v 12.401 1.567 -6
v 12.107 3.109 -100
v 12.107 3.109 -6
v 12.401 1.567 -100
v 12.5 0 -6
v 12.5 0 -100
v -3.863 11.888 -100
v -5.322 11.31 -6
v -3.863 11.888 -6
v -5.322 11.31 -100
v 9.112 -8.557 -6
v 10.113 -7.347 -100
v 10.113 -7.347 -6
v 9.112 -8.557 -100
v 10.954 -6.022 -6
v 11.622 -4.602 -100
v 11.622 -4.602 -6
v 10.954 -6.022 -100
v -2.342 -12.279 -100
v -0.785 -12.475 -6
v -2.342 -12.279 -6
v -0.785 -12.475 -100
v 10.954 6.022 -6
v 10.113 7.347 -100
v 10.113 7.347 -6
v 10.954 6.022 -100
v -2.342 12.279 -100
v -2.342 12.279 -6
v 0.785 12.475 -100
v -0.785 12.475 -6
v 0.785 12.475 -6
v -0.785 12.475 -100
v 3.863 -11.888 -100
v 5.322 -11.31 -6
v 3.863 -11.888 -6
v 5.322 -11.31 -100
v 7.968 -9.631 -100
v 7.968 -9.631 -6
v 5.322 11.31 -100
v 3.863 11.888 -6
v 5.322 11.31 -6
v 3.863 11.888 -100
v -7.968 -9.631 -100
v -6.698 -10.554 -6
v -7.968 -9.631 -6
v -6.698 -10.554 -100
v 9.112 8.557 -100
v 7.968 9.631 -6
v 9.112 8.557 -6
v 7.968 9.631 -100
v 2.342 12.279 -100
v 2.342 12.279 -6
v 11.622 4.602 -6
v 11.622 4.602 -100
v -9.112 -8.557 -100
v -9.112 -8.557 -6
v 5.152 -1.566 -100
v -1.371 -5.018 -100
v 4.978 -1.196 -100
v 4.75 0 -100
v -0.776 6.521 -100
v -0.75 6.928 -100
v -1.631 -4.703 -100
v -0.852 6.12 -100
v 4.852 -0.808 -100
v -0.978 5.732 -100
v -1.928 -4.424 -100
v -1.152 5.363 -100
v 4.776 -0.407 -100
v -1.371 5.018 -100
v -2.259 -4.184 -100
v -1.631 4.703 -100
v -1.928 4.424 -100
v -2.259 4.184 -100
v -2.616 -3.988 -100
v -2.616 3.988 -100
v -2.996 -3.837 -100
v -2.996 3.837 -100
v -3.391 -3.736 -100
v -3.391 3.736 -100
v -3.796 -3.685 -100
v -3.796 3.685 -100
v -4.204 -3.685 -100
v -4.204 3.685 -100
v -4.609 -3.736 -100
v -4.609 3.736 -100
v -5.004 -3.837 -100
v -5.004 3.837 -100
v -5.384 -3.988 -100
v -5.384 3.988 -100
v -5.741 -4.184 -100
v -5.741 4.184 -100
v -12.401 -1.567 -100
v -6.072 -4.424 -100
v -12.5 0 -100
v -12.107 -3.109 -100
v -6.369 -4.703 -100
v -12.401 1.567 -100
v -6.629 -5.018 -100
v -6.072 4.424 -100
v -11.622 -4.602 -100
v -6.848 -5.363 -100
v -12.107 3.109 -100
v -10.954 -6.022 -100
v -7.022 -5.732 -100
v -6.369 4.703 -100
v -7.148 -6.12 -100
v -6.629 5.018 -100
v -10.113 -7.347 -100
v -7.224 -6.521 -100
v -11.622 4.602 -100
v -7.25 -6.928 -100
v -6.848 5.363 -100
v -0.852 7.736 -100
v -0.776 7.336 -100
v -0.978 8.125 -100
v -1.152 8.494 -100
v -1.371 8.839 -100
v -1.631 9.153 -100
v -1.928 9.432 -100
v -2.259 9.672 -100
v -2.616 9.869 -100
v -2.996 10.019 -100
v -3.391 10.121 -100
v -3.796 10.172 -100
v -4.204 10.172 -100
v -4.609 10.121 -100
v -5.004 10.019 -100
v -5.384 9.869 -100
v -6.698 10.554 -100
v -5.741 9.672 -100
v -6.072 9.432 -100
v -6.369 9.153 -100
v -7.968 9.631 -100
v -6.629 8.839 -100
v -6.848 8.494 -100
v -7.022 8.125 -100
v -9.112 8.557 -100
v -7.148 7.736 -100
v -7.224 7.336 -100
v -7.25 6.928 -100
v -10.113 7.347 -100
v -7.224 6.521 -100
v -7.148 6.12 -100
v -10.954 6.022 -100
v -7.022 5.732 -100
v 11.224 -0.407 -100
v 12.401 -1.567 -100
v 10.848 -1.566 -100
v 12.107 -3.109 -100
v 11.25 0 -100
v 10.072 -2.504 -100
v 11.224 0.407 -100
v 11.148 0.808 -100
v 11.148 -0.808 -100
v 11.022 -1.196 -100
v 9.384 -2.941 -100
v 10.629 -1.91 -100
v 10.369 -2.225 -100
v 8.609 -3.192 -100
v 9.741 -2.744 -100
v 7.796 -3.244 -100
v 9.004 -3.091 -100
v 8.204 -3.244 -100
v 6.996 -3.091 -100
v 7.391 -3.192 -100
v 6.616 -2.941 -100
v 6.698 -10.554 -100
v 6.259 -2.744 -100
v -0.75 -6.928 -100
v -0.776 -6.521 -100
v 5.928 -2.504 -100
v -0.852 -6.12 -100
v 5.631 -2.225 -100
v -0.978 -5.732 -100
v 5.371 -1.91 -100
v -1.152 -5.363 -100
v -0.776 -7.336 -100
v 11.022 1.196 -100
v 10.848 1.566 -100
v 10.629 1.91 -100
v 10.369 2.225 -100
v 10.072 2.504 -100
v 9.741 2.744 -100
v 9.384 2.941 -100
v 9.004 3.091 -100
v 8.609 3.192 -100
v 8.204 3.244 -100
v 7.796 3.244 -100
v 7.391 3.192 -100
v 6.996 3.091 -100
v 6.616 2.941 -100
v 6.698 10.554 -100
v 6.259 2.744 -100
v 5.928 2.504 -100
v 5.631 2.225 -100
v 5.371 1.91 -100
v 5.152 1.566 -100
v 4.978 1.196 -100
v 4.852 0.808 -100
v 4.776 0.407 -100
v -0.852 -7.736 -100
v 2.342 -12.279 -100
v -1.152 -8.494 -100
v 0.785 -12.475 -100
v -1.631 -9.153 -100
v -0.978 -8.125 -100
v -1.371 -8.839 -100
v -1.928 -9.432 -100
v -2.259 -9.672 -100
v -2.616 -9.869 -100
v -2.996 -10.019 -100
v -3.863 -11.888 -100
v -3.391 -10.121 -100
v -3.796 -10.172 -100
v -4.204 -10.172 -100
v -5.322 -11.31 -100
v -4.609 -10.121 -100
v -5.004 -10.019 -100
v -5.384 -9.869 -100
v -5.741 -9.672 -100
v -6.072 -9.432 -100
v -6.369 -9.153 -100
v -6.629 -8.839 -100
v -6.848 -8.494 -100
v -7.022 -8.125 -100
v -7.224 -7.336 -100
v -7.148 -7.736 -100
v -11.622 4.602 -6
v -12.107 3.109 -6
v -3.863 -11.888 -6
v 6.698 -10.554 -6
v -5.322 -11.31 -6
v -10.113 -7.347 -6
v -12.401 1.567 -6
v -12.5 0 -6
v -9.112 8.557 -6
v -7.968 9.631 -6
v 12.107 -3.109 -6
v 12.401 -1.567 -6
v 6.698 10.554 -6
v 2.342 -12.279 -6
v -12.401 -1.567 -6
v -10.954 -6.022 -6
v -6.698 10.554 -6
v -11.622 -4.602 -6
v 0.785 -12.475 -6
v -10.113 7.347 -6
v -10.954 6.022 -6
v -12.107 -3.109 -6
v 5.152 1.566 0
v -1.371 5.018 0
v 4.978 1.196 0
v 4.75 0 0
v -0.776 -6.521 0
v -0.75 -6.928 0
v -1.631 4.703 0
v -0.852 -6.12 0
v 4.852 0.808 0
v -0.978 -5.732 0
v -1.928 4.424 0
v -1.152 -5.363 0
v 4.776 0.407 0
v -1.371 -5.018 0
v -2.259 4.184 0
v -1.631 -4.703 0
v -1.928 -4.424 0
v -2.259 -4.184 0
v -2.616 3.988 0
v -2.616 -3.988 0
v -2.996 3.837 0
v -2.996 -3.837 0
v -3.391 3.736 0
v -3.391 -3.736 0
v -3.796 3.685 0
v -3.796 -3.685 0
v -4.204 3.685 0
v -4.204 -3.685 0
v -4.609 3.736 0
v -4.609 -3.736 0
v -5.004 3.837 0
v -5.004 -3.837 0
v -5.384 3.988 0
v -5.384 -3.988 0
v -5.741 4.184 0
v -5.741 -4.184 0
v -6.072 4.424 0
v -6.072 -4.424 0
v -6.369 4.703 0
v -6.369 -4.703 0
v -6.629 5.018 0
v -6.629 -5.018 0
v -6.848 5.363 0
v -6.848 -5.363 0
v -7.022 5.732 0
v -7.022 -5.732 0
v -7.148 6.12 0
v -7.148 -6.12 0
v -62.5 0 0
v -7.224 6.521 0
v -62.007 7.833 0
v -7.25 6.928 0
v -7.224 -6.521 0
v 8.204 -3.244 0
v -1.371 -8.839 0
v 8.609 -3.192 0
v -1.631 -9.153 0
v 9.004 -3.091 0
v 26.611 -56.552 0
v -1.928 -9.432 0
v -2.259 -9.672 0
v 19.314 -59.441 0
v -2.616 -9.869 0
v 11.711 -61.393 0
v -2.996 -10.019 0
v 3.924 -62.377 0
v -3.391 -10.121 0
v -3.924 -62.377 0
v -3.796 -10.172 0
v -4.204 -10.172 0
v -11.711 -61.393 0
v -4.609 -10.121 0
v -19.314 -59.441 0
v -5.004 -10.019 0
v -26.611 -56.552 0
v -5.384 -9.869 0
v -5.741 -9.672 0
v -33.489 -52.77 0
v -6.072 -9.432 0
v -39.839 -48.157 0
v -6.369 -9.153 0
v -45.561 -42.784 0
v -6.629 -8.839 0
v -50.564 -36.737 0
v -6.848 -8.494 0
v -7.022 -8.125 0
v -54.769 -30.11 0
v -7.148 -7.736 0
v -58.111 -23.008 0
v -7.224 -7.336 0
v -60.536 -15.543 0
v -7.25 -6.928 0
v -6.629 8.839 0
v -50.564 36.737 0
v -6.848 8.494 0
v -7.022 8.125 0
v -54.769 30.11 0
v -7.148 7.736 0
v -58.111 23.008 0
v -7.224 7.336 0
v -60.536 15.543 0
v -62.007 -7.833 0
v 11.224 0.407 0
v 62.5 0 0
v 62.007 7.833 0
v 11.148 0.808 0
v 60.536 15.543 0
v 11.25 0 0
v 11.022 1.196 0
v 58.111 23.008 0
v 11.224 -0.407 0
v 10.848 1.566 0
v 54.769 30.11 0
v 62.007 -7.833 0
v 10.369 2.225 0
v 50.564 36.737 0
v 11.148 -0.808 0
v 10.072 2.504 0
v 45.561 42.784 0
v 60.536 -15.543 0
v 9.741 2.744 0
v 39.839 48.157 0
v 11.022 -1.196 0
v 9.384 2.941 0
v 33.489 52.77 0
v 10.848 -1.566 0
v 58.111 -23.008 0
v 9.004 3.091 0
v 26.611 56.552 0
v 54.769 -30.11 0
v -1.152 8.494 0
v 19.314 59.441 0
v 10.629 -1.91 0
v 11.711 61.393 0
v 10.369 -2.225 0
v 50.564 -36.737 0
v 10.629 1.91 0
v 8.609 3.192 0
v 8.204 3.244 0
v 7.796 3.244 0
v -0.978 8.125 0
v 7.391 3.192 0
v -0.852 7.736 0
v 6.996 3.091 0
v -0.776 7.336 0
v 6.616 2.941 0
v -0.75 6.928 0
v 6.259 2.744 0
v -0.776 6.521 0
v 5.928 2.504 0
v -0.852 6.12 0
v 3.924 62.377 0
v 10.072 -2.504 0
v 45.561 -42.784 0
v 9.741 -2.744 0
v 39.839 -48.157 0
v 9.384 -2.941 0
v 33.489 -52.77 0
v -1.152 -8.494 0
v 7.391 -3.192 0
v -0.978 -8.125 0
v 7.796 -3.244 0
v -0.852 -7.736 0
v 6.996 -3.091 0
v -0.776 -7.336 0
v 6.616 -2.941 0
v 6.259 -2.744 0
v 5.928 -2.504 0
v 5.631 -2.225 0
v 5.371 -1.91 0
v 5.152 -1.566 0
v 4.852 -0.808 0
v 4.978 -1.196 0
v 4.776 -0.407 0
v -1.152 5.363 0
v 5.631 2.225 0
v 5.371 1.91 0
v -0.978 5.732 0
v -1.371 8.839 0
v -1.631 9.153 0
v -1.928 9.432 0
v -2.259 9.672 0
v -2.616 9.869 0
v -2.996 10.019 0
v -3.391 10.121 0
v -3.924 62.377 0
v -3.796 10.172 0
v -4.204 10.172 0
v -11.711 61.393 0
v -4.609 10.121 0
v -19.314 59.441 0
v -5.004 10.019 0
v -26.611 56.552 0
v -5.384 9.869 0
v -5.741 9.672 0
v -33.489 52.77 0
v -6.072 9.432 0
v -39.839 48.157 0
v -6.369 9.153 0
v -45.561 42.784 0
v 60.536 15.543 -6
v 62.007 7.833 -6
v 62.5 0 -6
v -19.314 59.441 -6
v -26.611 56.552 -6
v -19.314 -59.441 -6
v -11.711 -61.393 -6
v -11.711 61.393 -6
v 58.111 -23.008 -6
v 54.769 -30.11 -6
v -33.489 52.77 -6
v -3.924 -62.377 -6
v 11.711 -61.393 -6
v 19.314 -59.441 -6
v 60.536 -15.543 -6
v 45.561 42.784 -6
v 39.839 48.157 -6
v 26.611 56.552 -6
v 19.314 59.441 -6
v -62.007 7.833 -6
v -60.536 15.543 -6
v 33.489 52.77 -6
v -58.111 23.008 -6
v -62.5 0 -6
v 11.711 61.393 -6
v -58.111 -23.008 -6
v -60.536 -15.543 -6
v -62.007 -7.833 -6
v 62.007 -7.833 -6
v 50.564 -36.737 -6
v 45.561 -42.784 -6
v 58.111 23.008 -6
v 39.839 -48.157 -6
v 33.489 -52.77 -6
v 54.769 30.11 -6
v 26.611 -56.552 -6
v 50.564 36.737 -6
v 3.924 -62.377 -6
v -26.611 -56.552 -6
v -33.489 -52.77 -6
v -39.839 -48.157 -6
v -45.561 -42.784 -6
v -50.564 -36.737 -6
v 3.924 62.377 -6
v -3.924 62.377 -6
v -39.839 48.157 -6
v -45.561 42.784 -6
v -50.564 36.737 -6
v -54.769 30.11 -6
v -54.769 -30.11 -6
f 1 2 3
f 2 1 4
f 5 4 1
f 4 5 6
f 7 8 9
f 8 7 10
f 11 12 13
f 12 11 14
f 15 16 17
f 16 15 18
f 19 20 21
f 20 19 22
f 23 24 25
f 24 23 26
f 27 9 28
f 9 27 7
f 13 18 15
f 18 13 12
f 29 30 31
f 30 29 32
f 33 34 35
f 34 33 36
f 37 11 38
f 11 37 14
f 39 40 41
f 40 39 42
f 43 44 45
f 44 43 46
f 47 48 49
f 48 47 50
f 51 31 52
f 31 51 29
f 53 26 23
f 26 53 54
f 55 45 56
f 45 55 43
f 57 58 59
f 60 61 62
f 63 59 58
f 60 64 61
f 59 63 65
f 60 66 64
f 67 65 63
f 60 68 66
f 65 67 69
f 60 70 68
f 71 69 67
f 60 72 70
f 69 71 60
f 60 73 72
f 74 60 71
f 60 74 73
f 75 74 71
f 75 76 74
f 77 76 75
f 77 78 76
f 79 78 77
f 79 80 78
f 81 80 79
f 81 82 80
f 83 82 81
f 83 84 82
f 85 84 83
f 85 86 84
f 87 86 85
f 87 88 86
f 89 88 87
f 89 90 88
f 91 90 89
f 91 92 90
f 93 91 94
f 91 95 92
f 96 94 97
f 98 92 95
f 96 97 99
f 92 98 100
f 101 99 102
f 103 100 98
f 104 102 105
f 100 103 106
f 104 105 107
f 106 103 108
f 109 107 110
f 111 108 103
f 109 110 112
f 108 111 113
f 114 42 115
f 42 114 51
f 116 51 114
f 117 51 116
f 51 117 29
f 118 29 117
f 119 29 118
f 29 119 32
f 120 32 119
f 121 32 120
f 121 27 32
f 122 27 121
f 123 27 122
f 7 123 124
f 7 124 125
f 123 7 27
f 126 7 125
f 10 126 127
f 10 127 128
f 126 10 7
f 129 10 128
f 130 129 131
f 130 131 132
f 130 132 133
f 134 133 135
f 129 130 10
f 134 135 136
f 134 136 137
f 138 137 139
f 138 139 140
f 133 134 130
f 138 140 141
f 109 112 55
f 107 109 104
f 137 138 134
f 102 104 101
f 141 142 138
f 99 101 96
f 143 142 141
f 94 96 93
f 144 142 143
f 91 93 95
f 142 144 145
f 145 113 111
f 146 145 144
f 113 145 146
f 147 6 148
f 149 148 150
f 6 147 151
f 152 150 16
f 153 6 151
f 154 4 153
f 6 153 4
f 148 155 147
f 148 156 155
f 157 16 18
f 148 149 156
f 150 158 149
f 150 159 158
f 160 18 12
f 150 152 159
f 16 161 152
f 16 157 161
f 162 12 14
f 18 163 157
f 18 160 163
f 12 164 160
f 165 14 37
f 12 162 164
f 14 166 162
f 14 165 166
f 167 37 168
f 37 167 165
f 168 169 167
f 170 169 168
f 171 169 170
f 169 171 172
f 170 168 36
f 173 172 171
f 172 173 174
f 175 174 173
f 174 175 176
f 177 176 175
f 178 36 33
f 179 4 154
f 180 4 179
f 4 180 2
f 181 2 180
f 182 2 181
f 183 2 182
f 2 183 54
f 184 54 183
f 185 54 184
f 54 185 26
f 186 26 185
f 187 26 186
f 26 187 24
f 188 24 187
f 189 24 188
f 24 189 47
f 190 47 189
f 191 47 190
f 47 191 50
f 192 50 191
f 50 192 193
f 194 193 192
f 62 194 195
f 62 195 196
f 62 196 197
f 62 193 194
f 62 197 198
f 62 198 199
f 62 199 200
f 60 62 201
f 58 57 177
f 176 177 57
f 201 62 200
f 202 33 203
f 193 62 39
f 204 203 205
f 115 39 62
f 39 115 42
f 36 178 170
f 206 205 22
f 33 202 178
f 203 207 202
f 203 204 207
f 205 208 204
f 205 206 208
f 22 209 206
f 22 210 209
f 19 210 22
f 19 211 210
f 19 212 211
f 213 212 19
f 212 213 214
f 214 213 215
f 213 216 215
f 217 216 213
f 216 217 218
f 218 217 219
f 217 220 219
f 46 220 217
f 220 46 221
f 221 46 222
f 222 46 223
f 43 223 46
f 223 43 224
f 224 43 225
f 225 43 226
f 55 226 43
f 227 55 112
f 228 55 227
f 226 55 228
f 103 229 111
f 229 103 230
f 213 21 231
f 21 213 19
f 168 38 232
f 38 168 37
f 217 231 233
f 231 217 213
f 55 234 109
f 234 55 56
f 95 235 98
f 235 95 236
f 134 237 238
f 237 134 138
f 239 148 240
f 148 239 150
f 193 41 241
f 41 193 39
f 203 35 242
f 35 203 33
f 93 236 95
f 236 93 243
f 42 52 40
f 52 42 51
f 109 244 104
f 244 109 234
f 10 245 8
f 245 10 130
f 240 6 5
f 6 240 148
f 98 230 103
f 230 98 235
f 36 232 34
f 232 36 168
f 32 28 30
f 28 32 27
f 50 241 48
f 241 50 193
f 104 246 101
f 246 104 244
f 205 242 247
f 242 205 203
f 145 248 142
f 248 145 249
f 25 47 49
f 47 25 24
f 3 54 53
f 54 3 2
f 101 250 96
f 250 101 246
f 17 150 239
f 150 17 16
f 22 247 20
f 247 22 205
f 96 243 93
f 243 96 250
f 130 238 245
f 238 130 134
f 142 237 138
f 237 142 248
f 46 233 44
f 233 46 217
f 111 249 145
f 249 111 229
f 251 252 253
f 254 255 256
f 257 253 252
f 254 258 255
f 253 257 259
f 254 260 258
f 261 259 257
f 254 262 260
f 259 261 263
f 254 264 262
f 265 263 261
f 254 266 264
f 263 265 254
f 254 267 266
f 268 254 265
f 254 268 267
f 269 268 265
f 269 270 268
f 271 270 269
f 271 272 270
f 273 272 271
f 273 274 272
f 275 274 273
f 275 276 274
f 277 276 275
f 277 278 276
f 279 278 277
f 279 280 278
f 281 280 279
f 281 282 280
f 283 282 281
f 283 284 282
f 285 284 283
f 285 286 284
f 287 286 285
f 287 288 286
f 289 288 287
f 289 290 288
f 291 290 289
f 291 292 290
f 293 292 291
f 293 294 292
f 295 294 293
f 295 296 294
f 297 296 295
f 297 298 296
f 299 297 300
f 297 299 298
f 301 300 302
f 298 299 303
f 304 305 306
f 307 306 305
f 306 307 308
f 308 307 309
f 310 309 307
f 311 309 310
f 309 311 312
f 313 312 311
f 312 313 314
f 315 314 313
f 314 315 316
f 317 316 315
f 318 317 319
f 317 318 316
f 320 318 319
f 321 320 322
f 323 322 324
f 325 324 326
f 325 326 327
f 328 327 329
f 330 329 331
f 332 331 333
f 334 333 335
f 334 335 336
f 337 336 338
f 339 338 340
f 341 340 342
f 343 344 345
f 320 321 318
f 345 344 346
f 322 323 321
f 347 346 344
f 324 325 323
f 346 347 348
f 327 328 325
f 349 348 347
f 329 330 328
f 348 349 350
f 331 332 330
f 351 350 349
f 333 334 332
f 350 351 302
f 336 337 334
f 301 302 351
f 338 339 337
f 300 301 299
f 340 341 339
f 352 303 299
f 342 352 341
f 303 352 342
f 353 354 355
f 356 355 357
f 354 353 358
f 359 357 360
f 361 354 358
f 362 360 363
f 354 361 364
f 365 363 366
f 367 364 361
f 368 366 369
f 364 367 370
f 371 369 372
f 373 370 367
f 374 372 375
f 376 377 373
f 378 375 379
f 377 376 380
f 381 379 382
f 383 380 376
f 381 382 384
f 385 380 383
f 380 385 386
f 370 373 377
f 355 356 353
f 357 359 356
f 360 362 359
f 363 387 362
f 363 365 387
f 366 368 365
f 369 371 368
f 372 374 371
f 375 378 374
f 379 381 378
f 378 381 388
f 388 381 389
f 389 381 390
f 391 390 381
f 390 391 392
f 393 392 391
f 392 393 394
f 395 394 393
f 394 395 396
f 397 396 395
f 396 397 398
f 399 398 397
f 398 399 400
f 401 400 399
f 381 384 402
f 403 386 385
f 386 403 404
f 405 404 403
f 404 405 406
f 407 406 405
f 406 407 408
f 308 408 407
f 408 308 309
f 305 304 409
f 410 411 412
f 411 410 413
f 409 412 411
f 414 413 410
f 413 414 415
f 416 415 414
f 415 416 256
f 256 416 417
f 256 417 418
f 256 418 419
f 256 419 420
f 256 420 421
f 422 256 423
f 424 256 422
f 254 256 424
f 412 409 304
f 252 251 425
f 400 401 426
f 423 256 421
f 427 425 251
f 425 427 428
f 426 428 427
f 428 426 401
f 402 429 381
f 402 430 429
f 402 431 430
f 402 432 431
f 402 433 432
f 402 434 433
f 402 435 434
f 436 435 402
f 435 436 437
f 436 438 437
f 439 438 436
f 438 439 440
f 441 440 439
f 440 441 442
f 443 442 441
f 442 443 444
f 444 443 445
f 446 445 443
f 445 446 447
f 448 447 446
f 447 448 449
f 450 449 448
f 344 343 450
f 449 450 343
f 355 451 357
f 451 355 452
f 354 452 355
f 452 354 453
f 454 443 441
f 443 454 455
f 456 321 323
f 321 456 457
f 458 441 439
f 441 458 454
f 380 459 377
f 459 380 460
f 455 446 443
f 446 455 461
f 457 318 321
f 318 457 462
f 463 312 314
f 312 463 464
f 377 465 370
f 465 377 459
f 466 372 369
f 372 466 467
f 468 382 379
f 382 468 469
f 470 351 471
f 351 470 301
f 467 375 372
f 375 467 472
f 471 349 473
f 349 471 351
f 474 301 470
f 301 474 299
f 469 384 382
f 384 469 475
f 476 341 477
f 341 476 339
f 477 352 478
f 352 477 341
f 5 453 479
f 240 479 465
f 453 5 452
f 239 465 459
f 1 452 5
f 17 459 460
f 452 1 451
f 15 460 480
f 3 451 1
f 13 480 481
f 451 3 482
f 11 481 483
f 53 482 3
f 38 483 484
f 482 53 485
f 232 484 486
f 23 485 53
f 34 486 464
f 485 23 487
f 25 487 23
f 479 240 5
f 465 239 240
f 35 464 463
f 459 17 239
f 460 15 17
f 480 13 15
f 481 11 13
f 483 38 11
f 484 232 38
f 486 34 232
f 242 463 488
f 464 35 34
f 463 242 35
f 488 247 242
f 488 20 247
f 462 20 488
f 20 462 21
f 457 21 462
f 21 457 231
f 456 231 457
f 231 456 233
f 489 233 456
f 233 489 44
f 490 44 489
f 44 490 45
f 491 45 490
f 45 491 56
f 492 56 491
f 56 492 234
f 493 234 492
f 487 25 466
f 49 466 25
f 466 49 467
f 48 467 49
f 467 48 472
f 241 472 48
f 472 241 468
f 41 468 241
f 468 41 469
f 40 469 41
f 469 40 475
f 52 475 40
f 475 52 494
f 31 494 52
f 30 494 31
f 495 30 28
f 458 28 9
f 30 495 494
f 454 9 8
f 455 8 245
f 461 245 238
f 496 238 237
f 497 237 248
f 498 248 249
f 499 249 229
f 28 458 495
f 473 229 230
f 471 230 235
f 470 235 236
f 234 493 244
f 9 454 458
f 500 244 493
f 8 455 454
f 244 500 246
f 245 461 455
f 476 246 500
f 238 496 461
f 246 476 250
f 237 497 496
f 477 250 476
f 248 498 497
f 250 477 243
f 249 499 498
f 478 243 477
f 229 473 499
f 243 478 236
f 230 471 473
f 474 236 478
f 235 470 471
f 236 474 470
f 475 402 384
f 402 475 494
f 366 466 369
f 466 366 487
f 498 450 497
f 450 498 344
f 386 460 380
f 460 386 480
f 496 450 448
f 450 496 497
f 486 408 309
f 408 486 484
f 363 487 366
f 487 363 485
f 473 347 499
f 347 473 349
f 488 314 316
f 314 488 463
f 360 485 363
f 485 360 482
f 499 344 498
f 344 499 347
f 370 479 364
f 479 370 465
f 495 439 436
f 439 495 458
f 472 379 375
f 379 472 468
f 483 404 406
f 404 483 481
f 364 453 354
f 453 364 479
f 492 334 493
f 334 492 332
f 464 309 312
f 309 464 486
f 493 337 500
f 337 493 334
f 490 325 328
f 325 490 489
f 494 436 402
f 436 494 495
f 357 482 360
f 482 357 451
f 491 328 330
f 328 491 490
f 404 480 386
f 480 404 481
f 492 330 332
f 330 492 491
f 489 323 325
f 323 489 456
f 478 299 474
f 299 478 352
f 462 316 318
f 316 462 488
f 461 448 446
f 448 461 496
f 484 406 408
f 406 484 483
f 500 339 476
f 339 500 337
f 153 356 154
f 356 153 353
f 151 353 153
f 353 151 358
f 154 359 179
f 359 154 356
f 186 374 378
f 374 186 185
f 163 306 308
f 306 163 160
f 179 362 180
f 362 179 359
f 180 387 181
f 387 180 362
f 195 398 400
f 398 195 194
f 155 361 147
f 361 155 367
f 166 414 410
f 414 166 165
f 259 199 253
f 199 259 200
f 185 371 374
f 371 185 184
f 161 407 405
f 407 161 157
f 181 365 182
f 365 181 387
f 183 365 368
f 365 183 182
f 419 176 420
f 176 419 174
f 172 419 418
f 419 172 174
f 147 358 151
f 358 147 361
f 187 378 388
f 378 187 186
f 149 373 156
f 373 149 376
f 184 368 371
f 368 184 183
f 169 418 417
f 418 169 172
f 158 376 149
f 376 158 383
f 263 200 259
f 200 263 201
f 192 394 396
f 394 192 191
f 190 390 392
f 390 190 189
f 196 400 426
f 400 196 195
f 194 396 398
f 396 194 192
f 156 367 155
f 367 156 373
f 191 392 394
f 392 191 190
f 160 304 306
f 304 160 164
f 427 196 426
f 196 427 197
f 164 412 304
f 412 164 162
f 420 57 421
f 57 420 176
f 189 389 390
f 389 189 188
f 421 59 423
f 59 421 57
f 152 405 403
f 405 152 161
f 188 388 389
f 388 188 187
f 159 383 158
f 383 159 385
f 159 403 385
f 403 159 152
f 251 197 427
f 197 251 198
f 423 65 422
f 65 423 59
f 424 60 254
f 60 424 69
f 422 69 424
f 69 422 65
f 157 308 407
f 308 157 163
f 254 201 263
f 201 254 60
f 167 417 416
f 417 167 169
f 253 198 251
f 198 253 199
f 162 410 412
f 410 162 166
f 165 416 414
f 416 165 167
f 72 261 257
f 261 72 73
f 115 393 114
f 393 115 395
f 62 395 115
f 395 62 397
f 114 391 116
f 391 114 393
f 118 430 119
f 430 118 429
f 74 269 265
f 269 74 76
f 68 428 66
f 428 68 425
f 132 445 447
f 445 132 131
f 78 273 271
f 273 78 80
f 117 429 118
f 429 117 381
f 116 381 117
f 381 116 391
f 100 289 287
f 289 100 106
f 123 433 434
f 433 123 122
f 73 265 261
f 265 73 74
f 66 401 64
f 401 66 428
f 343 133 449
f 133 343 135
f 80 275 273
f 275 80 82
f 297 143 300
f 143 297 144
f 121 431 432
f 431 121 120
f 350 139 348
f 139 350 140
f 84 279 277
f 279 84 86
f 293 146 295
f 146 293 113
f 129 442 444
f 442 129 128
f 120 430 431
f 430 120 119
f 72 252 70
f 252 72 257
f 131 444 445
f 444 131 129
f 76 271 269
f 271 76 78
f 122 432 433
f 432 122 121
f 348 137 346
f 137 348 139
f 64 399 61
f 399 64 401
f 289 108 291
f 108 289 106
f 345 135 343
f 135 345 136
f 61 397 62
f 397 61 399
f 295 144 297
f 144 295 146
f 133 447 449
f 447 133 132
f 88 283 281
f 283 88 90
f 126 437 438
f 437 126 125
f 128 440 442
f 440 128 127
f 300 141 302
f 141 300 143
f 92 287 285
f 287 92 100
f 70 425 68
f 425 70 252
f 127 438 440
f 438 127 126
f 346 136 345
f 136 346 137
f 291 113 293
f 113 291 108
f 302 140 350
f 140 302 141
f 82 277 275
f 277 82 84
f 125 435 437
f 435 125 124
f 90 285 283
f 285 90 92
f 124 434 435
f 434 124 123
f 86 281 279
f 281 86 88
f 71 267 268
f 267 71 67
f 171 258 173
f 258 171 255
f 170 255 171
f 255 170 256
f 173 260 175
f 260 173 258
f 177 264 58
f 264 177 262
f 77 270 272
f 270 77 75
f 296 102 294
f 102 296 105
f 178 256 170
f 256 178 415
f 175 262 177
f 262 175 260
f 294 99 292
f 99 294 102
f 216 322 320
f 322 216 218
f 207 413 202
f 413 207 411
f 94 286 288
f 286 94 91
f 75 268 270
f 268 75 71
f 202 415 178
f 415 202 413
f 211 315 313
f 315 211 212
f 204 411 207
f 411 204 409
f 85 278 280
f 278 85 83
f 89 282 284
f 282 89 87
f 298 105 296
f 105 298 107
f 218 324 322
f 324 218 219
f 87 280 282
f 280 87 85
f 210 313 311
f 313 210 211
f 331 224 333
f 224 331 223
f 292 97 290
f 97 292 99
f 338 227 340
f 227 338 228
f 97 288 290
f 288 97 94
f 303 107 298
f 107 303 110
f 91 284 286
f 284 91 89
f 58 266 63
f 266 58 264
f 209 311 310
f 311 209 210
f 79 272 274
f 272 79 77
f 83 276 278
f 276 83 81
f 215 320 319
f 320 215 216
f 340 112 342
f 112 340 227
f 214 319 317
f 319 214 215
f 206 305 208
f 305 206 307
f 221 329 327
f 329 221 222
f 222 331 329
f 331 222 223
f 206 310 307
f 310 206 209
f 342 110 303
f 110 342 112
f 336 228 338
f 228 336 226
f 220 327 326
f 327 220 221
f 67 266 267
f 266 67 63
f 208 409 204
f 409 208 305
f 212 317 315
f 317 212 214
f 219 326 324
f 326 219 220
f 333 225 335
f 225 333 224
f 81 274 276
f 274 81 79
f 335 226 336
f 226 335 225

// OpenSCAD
$fn = 50;


difference() {
	union() {
		translate(v = [0, 0, -100.0000000000]) {
			cylinder(h = 100, r = 12.5000000000);
		}
		translate(v = [0, 0, -6.0000000000]) {
			cylinder(h = 6, r = 62.5000000000);
		}
	}
	union() {
		#translate(v = [8.0000000000, 0.0000000000, -100]) {
			cylinder(h = 100, r = 3.2500000000);
		}
		#translate(v = [-4.0000000000, 6.9282032303, -100]) {
			cylinder(h = 100, r = 3.2500000000);
		}
		#translate(v = [-4.0000000000, -6.9282032303, -100]) {
			cylinder(h = 100, r = 3.2500000000);
		}
	}
}
